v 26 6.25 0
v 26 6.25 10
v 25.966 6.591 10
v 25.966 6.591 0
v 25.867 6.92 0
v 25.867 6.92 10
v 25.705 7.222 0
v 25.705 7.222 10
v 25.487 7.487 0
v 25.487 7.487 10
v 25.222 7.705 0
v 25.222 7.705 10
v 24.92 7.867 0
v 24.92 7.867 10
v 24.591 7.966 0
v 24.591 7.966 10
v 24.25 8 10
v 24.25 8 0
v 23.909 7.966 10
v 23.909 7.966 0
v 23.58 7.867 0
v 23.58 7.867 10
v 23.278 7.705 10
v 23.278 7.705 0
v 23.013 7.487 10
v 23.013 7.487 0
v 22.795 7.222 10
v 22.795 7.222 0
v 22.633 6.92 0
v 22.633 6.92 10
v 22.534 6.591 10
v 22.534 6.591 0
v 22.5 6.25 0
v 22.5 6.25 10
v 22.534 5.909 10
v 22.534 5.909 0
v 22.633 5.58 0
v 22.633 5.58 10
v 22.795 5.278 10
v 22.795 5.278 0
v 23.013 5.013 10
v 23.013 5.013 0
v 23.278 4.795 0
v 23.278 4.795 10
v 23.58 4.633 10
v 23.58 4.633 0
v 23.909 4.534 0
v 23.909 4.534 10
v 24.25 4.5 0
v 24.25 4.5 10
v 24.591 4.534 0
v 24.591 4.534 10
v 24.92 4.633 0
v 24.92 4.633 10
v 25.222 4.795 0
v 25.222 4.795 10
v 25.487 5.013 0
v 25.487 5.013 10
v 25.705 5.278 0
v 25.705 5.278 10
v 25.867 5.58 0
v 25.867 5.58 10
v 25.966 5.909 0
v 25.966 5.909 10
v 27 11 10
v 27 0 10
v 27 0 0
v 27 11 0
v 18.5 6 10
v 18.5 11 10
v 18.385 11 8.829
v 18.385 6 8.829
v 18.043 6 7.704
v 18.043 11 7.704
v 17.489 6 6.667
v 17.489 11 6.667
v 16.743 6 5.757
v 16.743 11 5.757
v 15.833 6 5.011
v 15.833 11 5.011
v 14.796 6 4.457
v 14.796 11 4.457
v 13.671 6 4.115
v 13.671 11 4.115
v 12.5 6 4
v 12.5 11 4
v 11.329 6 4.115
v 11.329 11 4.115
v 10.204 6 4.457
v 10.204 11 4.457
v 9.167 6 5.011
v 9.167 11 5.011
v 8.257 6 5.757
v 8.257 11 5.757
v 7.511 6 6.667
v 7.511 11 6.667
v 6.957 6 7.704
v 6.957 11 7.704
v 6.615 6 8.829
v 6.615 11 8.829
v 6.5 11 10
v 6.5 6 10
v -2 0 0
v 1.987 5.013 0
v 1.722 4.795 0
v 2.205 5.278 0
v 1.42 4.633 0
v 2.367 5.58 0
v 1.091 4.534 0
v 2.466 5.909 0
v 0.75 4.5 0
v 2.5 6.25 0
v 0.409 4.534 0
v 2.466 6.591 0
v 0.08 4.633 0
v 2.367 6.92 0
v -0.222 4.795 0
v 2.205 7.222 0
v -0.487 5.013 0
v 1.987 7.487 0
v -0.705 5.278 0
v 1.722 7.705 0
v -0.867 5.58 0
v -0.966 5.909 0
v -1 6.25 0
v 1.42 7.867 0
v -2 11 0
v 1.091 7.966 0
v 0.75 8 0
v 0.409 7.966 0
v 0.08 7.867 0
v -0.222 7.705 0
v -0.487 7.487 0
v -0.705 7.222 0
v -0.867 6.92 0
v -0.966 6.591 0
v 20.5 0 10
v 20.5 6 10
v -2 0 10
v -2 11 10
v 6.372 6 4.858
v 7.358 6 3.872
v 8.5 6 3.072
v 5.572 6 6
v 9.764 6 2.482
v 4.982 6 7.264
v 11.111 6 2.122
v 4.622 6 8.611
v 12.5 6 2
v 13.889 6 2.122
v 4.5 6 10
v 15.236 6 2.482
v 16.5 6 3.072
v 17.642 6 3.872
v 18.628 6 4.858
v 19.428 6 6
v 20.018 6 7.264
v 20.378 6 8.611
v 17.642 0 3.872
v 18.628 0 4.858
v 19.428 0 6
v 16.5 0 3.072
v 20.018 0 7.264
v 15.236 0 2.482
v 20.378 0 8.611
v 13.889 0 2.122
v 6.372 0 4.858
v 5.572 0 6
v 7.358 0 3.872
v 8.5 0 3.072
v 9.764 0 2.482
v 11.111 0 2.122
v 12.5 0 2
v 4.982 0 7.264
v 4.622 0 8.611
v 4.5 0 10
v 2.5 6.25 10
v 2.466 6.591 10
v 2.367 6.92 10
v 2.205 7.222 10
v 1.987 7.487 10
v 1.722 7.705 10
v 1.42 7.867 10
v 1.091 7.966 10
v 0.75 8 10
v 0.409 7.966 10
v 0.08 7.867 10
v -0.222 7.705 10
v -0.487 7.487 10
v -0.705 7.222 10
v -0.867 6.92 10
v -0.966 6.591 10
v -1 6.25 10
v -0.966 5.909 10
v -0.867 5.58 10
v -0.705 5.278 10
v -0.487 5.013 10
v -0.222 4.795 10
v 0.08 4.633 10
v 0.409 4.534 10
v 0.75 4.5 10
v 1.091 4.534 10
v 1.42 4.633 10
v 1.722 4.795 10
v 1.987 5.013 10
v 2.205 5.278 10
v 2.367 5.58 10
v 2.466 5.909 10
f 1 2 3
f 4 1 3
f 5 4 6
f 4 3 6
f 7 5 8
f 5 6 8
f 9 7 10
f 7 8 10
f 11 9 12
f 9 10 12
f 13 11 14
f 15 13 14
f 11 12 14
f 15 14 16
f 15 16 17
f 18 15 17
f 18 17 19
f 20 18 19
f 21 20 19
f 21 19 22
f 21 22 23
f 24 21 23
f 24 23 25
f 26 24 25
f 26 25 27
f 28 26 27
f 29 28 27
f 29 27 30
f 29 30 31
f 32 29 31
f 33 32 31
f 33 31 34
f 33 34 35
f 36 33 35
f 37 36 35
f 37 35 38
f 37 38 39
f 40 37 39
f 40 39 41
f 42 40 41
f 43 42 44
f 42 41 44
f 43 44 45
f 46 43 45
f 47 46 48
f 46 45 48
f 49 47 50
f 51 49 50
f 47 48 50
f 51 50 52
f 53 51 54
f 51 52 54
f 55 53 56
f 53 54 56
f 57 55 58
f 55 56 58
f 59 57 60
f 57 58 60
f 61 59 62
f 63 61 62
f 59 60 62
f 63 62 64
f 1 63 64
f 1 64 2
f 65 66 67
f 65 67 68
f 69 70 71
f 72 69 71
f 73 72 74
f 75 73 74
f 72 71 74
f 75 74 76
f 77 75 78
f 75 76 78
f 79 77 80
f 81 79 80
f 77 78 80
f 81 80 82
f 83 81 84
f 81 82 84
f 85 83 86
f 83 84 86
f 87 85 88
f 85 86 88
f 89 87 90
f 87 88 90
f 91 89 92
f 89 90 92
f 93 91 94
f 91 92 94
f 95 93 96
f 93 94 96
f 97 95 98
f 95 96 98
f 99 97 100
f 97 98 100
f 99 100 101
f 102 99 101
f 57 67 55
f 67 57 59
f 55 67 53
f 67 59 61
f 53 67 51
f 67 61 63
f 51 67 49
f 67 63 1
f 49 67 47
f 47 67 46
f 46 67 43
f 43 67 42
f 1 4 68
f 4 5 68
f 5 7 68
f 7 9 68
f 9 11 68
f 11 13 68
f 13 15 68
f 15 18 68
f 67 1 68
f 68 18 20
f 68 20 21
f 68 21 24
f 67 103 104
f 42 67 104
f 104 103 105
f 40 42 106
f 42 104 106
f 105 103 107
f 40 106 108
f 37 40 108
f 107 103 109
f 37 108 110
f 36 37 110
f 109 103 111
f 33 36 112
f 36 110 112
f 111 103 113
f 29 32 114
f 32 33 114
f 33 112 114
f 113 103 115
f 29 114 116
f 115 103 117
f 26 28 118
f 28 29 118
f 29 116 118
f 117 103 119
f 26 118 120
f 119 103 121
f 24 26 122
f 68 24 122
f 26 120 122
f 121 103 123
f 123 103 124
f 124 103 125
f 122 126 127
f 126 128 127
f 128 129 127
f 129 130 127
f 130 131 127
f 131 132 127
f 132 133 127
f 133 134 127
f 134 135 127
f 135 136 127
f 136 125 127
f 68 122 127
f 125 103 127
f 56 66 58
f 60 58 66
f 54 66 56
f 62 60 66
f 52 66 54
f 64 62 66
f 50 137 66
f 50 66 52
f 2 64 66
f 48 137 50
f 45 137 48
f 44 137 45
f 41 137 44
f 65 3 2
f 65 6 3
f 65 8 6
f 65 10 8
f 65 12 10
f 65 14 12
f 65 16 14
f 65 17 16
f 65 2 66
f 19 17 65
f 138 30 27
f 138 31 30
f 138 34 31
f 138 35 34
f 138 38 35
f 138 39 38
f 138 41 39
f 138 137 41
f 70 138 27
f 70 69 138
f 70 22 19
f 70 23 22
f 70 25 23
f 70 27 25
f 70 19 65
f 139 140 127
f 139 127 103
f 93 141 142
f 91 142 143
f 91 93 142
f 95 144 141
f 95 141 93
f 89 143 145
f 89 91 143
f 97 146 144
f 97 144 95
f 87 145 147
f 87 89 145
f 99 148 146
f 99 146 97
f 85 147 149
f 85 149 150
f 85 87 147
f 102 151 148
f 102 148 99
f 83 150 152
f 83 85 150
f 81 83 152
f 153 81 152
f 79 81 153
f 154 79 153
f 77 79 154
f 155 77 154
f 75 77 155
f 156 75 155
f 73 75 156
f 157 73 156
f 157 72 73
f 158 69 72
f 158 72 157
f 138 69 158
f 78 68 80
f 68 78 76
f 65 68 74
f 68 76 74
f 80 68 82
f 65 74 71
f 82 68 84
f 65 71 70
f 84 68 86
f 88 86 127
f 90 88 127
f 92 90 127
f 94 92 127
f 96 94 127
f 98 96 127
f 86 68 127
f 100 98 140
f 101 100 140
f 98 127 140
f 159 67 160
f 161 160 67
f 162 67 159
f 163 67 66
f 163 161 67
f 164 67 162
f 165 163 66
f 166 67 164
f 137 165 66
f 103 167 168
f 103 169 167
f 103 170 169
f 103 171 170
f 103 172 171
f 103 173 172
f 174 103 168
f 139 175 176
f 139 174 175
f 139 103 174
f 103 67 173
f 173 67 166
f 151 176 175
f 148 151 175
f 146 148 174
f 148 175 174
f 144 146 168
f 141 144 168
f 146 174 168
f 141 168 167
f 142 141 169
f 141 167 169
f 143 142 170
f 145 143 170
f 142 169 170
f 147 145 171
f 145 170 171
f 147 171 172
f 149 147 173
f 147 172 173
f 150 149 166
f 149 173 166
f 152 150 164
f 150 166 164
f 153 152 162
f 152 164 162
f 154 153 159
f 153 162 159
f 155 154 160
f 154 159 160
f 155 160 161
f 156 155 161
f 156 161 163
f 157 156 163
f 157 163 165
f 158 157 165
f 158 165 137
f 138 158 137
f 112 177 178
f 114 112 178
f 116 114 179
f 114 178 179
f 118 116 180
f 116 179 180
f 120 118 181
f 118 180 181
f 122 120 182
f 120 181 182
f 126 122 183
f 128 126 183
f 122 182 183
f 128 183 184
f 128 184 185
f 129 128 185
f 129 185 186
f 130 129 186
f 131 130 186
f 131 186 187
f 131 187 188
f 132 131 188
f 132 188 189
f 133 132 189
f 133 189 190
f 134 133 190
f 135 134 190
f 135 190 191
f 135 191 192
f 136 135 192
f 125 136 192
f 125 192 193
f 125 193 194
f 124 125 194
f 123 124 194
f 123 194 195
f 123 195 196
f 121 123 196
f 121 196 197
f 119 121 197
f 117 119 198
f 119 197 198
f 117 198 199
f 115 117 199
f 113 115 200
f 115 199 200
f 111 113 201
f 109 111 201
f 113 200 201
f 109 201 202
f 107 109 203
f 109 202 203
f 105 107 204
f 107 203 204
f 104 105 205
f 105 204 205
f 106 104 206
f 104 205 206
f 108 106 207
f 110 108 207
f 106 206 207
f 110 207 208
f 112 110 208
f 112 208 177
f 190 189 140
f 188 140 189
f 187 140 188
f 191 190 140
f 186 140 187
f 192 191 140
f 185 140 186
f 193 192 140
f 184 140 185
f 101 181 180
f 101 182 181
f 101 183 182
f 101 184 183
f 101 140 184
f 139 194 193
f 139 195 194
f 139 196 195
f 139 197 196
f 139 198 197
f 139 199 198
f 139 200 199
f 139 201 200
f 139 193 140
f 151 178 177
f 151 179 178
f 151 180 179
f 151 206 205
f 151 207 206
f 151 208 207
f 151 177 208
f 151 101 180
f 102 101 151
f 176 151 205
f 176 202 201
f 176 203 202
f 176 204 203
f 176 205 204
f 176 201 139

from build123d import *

# Parameters (mm, degrees)
F0_W      = 25
F0_H      = 11
F1_DEPTH  = 10
F2_R      = 8
F3_DEPTH  = 6
F4_R      = 6
F5_DEPTH  = 6
F6_W      = 11
F6_H      = 10
F7_DEPTH  = 2
F8_W      = 11
F8_H      = 10
F9_DEPTH  = 2
F10_R     = 1.75
F11_DEPTH = 25


with BuildPart() as f1:
    # F0 (on Top) → F1 (new body)
    with BuildSketch(Plane.XY):
        with Locations((12.5, 5.5)):
            Rectangle(F0_W, F0_H)
    extrude(amount=F1_DEPTH)

    # F2 (on face) → F3 (cut)
    with BuildSketch(Plane.XZ):
        with Locations((12.5, 10)):
            Circle(F2_R)
    extrude(amount=-F3_DEPTH, mode=Mode.SUBTRACT)

    # F4 (on face) → F5 (cut)
    with BuildSketch(Plane(origin=(0, 11, 0), x_dir=(-1, 0, 0), z_dir=(0, 1, 0))):
        with Locations((-12.5, 10)):
            Circle(F4_R)
    extrude(amount=-F5_DEPTH, mode=Mode.SUBTRACT)

    # F6 (on face) → F7 (join)
    with BuildSketch(Plane(origin=(0, 0, 0), x_dir=(0, -1, 0), z_dir=(-1, 0, 0))):
        with Locations((-5.5, 5)):
            Rectangle(F6_W, F6_H)
    extrude(amount=F7_DEPTH)

    # F8 (on face) → F9 (join)
    with BuildSketch(Plane.YZ.offset(25)):
        with Locations((5.5, 5)):
            Rectangle(F8_W, F8_H)
    extrude(amount=F9_DEPTH)

    # F10 (on face) → F11 (cut)
    with BuildSketch(Plane.XY.offset(10)):
        with Locations((0.75, 6.25)):
            Circle(F10_R)
        with Locations((24.25, 6.25)):
            Circle(F10_R)
    extrude(amount=-F11_DEPTH, mode=Mode.SUBTRACT)


solid = f1.part
